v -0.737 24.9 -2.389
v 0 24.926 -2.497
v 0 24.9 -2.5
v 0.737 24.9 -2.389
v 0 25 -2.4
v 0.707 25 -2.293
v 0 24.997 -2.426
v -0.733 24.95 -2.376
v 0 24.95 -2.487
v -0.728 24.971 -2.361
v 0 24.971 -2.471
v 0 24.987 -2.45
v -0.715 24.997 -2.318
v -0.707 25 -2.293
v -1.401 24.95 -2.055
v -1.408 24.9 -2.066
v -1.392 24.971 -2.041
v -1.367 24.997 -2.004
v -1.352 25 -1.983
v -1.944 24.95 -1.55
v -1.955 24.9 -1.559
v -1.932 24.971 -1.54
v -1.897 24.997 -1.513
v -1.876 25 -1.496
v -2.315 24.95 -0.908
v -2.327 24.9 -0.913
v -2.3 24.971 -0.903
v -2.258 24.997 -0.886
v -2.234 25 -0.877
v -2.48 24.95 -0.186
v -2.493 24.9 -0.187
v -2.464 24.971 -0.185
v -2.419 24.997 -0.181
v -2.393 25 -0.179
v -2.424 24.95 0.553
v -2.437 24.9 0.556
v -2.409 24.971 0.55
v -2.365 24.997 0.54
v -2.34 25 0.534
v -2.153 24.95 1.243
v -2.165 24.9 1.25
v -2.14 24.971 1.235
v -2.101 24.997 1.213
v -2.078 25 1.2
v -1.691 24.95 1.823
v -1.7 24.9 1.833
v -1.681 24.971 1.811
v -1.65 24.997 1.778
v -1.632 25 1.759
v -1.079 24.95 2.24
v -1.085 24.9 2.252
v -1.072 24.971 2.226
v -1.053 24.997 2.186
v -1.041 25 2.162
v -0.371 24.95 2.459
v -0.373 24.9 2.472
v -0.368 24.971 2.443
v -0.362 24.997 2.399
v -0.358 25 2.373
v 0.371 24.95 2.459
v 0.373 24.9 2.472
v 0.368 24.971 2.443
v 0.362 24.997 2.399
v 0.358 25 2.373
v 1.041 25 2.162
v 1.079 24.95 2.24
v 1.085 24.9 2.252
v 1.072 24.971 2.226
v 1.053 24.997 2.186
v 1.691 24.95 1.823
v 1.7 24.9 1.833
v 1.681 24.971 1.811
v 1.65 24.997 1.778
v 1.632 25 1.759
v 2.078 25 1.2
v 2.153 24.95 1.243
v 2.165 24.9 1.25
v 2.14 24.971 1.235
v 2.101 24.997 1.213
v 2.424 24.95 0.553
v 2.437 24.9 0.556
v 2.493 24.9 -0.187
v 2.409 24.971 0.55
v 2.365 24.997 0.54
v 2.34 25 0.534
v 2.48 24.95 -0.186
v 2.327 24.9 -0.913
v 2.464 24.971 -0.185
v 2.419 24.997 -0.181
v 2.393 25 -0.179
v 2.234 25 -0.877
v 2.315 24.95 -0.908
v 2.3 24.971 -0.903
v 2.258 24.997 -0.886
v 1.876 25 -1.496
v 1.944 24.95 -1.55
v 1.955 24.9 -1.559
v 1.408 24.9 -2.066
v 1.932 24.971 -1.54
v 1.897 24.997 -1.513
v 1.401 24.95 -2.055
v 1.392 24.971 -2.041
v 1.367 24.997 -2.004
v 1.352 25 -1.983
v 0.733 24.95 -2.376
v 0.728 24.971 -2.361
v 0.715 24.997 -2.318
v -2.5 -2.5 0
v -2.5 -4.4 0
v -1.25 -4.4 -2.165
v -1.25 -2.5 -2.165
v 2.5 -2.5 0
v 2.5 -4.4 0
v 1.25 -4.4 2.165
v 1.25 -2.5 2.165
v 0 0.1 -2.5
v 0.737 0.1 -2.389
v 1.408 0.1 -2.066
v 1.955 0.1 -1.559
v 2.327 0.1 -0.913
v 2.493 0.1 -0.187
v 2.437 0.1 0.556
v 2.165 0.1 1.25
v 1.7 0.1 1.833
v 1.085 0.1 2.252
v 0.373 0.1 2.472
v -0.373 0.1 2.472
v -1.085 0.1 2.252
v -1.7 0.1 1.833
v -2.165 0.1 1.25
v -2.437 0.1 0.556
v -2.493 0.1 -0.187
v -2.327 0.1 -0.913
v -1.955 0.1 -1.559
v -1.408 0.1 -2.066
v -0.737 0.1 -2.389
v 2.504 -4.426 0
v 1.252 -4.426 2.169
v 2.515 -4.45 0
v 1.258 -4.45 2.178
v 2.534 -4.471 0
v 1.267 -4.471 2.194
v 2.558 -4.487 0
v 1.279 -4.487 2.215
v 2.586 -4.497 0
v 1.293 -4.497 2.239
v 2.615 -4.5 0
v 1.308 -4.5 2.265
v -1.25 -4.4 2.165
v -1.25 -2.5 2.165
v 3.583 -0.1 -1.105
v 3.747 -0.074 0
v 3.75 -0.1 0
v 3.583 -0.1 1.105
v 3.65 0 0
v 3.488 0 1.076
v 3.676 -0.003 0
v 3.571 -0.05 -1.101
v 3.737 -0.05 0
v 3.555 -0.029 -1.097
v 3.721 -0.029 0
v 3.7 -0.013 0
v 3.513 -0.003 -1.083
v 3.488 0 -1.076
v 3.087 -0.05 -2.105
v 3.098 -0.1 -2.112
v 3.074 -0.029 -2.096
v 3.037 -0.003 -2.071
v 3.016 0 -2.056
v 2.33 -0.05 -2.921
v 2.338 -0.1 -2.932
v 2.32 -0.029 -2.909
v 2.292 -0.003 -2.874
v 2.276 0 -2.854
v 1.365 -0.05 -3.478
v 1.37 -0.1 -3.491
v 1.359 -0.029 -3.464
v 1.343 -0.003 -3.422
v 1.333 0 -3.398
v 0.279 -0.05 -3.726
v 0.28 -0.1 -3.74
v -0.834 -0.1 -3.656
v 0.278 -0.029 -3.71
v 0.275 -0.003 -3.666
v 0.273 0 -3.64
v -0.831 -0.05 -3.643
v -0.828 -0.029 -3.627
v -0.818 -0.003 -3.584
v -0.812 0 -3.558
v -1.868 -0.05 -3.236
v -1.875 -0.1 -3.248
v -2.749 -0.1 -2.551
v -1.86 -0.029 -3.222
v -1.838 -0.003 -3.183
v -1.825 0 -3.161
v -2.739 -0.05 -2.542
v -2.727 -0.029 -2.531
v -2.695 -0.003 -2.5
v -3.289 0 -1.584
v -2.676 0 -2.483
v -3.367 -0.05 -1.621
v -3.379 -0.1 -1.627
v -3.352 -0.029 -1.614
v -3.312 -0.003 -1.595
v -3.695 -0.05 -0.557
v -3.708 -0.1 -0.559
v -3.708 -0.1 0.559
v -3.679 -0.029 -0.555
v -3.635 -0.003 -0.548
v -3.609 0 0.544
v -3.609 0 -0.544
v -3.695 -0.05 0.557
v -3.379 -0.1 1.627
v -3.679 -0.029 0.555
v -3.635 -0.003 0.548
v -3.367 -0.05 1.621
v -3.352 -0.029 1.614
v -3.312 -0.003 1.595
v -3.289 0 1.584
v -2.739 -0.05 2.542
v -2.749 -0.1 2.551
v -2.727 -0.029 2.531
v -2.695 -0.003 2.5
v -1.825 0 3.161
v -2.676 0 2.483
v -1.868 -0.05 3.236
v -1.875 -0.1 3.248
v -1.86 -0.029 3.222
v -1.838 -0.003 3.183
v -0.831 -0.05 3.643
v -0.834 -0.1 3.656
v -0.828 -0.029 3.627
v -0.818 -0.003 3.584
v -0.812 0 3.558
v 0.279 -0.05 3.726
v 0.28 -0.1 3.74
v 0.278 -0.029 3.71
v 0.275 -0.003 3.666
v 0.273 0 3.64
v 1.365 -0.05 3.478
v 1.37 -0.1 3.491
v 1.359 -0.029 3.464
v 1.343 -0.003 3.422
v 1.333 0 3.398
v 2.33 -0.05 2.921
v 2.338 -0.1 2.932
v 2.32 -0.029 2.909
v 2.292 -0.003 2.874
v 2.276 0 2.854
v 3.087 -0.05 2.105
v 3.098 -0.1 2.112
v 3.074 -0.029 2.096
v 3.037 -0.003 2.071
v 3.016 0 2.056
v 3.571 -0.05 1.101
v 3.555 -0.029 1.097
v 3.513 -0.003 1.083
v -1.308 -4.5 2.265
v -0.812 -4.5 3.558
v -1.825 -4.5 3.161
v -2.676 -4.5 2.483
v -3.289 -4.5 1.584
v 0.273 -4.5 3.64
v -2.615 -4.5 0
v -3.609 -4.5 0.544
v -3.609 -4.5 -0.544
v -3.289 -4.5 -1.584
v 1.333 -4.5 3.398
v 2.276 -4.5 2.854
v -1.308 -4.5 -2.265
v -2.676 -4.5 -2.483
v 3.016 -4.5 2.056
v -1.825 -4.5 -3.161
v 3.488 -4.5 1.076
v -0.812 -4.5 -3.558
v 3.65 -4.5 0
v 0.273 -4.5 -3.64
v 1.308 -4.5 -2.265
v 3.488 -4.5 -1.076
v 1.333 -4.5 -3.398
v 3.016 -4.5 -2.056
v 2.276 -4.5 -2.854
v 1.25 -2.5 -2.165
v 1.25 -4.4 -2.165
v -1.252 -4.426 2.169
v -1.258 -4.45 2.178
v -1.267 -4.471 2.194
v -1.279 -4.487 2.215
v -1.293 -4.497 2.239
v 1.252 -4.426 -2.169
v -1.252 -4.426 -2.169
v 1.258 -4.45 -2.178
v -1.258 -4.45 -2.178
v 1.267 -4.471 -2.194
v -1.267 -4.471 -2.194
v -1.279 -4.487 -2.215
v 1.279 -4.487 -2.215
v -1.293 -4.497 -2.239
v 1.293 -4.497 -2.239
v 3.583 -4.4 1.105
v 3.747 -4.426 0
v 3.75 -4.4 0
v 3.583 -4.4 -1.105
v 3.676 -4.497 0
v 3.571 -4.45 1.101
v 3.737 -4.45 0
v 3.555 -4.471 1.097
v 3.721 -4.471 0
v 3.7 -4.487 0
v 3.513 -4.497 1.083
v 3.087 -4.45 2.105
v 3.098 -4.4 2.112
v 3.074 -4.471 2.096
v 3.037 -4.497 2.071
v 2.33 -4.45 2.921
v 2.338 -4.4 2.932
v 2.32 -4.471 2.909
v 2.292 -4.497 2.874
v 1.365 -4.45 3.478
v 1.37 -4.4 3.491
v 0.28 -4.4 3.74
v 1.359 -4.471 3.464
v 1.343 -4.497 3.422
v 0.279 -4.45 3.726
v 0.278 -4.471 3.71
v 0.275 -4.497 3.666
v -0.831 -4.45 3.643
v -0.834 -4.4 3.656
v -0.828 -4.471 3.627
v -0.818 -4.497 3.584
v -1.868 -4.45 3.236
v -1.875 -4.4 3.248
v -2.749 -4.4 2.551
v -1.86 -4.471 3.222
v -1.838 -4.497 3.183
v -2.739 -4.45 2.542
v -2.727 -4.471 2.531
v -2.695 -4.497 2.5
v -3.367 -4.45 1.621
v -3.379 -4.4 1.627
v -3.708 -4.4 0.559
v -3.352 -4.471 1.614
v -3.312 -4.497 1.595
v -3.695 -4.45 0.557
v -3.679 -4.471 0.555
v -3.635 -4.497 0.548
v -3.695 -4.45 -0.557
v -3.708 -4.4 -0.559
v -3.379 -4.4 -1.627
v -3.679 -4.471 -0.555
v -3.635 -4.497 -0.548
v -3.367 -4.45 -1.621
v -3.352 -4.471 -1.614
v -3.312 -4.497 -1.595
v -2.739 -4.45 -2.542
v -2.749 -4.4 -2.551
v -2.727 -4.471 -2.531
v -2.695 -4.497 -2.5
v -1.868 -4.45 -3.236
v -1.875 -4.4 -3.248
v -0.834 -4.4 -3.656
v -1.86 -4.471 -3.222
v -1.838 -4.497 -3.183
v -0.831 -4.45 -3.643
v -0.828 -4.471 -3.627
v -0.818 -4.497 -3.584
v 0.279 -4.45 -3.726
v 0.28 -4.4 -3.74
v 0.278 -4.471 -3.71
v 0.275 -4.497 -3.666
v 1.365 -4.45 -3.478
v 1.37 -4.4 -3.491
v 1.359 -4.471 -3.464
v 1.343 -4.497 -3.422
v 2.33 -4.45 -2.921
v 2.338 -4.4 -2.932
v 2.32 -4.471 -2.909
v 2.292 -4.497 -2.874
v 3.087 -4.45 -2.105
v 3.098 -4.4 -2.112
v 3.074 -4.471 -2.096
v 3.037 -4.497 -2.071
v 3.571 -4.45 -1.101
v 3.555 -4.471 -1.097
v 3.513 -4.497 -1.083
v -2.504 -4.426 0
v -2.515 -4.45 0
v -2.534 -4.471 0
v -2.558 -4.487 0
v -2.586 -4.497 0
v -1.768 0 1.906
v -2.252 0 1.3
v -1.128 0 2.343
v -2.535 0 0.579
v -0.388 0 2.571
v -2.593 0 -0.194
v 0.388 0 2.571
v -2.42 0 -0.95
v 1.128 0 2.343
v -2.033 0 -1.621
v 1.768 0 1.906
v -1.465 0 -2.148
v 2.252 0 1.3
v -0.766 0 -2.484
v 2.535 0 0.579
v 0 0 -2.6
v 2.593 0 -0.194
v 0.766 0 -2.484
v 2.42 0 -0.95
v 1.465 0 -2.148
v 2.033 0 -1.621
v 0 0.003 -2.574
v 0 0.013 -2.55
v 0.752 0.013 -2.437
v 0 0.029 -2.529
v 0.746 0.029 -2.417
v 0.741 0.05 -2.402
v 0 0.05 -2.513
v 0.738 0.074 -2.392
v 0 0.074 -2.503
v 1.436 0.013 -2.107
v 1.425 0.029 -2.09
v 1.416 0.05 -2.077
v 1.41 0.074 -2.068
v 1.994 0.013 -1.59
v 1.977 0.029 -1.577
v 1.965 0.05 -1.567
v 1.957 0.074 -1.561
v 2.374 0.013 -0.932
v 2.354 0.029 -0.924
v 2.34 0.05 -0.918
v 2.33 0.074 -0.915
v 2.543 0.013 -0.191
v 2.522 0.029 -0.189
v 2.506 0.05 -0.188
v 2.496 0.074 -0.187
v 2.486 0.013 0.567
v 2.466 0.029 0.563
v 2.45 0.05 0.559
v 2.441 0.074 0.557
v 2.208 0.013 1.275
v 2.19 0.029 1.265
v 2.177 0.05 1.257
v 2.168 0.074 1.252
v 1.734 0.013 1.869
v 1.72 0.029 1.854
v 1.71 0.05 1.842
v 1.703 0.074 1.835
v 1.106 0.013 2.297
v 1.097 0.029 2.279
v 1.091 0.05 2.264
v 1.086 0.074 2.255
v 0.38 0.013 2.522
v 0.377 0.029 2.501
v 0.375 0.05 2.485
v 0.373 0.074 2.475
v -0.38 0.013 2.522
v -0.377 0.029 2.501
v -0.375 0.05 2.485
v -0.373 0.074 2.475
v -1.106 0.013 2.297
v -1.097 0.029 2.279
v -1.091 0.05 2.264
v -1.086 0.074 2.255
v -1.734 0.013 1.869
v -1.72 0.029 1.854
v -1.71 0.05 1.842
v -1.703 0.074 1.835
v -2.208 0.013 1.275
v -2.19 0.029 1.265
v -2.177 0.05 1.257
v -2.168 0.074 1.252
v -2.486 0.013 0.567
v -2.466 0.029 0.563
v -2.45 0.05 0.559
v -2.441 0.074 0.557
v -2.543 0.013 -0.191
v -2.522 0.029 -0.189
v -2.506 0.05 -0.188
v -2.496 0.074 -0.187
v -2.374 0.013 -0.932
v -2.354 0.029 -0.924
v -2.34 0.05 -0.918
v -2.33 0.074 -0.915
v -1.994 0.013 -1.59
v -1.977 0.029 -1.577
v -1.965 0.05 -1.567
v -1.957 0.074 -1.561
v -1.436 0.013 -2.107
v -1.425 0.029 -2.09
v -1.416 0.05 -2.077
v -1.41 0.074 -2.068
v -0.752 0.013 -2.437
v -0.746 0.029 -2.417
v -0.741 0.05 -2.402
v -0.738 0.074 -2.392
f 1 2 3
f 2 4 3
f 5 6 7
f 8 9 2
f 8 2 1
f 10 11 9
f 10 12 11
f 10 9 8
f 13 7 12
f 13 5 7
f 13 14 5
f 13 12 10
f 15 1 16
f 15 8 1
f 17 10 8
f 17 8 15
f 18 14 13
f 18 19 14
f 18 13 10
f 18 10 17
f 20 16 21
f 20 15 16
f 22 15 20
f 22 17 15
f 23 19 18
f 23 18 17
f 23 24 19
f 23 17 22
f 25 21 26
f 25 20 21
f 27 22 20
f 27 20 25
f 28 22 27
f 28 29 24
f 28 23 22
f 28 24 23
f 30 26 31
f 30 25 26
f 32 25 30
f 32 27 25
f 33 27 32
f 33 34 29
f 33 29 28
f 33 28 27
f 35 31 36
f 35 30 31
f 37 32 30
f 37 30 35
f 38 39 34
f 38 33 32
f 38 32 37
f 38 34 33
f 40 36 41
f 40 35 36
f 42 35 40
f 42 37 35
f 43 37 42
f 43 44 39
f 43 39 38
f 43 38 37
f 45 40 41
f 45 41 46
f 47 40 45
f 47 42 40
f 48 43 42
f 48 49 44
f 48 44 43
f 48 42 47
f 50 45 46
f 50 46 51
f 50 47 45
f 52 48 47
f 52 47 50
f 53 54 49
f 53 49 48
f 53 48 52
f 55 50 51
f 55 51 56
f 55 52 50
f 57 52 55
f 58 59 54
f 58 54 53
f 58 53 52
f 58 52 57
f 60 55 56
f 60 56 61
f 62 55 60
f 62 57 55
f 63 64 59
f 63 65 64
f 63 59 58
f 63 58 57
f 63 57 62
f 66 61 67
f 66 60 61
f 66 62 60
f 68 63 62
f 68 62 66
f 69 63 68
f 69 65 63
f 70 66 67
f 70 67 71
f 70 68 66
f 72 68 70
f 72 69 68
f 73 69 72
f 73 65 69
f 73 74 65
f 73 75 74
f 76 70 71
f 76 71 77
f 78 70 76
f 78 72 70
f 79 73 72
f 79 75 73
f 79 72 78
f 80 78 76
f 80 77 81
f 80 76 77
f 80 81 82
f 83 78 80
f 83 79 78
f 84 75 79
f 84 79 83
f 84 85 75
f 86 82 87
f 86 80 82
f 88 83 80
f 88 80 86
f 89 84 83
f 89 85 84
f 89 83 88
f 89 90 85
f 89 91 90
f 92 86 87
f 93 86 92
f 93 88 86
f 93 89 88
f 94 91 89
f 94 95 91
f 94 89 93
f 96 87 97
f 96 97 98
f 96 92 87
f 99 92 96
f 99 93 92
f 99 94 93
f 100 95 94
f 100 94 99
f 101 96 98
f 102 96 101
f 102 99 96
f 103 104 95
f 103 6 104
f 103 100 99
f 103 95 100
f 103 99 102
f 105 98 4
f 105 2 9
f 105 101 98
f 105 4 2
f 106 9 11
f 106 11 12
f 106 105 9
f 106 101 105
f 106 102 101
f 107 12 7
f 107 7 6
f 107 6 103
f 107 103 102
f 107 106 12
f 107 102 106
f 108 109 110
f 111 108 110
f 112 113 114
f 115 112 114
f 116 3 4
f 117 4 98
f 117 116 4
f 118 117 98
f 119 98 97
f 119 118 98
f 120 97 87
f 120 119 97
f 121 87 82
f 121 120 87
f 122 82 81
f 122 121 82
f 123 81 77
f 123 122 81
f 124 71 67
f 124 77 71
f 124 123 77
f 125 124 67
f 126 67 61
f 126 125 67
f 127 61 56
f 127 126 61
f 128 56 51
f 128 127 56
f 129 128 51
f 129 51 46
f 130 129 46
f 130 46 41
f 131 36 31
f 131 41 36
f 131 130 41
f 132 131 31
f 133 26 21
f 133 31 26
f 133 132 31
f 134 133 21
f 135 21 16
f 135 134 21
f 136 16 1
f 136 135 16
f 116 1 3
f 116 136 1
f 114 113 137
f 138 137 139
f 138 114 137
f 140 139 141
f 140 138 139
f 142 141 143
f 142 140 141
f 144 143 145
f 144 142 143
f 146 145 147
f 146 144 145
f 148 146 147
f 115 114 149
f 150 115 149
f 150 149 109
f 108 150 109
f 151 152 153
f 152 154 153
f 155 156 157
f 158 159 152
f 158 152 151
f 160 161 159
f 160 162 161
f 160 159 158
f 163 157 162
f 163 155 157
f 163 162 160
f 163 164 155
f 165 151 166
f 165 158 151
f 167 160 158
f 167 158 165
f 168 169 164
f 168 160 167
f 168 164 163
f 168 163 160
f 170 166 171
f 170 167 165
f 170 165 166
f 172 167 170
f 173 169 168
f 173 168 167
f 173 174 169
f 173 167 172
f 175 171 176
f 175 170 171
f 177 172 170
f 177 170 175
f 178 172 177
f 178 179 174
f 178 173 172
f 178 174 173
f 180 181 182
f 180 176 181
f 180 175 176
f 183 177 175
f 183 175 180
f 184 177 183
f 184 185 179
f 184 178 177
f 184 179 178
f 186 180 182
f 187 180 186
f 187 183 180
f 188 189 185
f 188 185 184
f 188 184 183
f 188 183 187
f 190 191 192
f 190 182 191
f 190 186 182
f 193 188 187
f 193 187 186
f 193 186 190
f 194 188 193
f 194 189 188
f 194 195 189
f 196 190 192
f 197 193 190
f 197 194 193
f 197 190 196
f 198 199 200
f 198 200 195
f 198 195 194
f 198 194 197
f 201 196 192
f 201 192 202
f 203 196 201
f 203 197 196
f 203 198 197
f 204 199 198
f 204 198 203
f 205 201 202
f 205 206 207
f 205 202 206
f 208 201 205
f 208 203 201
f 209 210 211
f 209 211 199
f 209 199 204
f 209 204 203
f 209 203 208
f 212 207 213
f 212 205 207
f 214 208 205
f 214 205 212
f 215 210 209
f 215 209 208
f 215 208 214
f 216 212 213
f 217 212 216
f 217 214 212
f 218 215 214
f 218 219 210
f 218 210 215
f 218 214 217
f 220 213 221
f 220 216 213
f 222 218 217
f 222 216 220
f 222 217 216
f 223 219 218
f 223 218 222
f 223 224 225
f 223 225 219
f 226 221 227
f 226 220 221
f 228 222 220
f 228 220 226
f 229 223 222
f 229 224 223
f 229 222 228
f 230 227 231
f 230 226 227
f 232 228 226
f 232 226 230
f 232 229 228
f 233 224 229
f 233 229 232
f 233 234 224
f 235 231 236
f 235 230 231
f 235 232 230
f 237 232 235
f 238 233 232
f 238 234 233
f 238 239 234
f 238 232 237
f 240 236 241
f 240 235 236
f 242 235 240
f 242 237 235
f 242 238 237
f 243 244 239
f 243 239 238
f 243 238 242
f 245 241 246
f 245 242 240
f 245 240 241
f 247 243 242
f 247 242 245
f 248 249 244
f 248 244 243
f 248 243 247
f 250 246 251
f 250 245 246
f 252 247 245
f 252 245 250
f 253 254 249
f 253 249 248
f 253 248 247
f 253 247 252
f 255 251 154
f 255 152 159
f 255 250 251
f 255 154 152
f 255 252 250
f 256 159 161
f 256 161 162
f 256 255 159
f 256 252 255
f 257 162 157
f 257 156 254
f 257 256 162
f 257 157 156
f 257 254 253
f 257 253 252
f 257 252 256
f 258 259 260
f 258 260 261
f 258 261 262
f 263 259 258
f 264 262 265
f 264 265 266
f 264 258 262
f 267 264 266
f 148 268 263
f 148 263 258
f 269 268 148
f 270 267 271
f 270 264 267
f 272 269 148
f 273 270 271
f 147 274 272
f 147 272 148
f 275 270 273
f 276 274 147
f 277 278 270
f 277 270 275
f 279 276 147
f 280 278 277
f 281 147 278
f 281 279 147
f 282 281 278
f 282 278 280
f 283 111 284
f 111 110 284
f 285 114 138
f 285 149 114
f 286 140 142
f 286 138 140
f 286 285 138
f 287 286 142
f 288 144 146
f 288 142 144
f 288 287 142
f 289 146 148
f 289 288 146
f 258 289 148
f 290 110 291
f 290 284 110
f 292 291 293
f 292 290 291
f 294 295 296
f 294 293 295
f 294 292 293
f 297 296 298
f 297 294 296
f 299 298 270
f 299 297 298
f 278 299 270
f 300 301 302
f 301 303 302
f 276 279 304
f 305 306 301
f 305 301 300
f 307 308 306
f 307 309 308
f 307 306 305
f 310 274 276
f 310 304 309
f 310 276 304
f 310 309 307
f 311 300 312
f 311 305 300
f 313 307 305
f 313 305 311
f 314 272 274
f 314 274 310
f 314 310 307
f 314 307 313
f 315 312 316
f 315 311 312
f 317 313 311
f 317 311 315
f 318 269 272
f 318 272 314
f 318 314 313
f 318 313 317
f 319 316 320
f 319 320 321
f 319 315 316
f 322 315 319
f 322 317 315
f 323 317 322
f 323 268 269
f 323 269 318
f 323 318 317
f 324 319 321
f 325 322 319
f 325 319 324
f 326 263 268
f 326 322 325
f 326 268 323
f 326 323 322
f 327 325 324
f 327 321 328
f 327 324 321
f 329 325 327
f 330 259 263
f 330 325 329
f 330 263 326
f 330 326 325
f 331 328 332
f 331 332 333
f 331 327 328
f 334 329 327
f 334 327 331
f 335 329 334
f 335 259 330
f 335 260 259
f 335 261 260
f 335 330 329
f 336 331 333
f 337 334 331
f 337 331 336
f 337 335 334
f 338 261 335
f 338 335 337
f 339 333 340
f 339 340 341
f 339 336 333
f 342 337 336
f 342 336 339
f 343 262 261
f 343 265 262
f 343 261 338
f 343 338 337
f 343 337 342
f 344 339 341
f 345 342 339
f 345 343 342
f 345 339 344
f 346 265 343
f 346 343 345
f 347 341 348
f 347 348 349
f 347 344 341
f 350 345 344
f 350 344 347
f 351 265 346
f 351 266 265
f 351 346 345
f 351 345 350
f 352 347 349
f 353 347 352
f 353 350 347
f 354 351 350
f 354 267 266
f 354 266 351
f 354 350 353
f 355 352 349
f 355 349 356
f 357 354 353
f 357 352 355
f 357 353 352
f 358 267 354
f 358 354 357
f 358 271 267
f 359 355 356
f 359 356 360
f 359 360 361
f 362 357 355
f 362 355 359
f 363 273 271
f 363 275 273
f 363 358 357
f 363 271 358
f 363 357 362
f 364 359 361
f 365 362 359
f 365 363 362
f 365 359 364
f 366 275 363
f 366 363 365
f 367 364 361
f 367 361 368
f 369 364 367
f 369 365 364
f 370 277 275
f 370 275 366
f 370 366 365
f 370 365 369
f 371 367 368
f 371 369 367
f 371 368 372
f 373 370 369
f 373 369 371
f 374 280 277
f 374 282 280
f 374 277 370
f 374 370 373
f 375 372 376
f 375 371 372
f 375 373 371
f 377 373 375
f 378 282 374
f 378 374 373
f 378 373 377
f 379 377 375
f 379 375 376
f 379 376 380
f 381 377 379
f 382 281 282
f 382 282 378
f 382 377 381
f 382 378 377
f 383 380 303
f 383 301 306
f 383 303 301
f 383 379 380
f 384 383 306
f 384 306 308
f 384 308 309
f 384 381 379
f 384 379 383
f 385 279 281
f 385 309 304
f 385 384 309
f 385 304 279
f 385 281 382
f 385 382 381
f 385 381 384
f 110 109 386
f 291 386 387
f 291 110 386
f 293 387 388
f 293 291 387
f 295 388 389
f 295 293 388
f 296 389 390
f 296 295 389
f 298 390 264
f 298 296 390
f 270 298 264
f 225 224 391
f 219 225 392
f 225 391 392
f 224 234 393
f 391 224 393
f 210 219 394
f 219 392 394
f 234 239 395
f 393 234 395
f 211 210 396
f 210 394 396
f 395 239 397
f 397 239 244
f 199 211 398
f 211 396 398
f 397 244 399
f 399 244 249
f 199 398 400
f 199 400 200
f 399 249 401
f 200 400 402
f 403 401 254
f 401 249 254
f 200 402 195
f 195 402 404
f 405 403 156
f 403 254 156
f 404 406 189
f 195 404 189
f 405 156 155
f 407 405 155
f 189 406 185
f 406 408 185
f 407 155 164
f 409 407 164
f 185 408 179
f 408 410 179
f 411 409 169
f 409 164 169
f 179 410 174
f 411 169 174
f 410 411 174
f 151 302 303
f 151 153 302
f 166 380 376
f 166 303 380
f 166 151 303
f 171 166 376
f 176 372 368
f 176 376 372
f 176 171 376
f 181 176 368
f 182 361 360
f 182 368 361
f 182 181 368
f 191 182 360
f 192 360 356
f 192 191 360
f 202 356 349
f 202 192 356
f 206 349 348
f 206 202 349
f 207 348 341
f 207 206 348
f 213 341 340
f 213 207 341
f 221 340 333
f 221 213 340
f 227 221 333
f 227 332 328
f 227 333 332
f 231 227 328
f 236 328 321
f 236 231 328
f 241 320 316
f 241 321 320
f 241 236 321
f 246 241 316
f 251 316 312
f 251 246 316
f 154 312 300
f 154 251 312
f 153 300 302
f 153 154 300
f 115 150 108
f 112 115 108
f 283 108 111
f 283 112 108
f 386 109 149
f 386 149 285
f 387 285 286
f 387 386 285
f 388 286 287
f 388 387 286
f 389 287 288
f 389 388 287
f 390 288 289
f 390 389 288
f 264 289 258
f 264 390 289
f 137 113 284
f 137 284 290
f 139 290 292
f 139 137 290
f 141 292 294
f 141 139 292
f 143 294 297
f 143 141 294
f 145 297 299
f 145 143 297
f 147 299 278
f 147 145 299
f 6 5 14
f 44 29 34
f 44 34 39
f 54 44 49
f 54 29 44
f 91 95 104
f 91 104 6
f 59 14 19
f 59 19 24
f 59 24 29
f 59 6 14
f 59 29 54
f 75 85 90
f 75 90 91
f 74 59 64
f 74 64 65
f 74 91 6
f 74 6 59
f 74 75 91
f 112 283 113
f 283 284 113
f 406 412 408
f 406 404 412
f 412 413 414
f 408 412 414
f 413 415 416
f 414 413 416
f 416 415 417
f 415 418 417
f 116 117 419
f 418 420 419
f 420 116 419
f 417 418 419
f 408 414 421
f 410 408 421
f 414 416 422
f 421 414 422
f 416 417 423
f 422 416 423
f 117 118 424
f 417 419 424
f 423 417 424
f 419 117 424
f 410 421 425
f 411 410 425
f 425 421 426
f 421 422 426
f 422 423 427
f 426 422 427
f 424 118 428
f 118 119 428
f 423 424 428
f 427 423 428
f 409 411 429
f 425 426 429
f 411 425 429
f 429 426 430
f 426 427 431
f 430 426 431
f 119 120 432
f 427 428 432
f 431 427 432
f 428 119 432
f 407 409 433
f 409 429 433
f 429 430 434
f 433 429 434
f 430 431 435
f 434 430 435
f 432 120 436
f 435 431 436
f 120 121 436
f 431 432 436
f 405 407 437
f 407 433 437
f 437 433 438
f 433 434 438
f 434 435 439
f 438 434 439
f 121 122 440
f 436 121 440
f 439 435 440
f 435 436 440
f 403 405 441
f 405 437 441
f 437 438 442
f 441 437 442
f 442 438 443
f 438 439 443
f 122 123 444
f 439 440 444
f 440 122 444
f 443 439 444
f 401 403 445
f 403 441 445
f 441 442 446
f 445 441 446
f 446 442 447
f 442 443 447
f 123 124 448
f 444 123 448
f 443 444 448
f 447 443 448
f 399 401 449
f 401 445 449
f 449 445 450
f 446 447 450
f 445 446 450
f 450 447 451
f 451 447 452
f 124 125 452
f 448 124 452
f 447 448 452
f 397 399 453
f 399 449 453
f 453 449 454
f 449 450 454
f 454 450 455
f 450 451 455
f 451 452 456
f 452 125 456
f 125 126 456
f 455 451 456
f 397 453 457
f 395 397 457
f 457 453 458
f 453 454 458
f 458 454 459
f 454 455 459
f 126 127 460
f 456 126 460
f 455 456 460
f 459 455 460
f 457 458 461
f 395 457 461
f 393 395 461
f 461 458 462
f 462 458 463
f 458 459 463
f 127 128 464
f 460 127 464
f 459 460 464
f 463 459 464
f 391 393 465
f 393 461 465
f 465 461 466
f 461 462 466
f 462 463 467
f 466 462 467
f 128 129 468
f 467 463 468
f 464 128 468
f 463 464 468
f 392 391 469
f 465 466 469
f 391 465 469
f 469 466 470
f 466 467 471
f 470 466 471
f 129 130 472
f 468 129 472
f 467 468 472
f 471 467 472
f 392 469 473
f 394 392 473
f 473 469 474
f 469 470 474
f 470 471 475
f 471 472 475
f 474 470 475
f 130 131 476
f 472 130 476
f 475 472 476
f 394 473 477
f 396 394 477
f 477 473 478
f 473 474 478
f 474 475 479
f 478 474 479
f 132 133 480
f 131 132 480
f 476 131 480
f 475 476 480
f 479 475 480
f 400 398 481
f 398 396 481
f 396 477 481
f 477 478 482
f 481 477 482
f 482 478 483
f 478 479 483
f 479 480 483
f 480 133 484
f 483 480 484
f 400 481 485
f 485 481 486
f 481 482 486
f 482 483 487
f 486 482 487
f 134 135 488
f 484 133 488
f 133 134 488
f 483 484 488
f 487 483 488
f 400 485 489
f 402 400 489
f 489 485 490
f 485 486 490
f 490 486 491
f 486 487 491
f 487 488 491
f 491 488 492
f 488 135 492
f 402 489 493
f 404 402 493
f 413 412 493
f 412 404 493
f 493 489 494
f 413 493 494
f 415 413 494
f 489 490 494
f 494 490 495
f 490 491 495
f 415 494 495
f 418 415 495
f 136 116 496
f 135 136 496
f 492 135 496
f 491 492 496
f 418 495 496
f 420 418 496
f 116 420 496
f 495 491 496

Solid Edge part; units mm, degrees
sketch "Sketch1" plane through (0, 0, 0) normal (0, -1, 0) x (1, 0, 0)
  circle A0 centre (0, 0) radius 3.75
extrude "Protrusion1" add sketch "Sketch1" along normal blind 4.5
sketch "Sketch2" plane through (0, 0, 0) normal (0, 1, 0) x (0, 0, -1)
  circle A0 centre (0, 0) radius 2.5
extrude "ExtrudedProtrusion_2" add sketch "Sketch2" along normal blind 25
sketch "Sketch3" plane through (0, -4.5, 0) normal (0, -1, 0) x (0, 0, 1)
  line L0 (-2.1651, 1.25) -> (-2.1651, -1.25)
  line L1 (-2.1651, -1.25) -> (0, -2.5)
  line L2 (0, -2.5) -> (2.1651, -1.25)
  line L3 (2.1651, -1.25) -> (2.1651, 1.25)
  line L4 (2.1651, 1.25) -> (0, 2.5)
  line L5 (0, 2.5) -> (-2.1651, 1.25)
extrude "ExtrudedCutout_1" cut sketch "Sketch3" against normal blind 2
fillet "Round_1" radius 0.1 10 edges at (-1.875, -4.5, 1.0825) (-1.875, -4.5, -1.0825) (0, -4.5, -2.1651) (1.875, -4.5, -1.0825) (1.875, -4.5, 1.0825) (0, -4.5, 2.1651) (-3.75, -4.5, 0) (-3.75, 0, 0) (0, 0, 2.5) (0, 25, 2.5)
